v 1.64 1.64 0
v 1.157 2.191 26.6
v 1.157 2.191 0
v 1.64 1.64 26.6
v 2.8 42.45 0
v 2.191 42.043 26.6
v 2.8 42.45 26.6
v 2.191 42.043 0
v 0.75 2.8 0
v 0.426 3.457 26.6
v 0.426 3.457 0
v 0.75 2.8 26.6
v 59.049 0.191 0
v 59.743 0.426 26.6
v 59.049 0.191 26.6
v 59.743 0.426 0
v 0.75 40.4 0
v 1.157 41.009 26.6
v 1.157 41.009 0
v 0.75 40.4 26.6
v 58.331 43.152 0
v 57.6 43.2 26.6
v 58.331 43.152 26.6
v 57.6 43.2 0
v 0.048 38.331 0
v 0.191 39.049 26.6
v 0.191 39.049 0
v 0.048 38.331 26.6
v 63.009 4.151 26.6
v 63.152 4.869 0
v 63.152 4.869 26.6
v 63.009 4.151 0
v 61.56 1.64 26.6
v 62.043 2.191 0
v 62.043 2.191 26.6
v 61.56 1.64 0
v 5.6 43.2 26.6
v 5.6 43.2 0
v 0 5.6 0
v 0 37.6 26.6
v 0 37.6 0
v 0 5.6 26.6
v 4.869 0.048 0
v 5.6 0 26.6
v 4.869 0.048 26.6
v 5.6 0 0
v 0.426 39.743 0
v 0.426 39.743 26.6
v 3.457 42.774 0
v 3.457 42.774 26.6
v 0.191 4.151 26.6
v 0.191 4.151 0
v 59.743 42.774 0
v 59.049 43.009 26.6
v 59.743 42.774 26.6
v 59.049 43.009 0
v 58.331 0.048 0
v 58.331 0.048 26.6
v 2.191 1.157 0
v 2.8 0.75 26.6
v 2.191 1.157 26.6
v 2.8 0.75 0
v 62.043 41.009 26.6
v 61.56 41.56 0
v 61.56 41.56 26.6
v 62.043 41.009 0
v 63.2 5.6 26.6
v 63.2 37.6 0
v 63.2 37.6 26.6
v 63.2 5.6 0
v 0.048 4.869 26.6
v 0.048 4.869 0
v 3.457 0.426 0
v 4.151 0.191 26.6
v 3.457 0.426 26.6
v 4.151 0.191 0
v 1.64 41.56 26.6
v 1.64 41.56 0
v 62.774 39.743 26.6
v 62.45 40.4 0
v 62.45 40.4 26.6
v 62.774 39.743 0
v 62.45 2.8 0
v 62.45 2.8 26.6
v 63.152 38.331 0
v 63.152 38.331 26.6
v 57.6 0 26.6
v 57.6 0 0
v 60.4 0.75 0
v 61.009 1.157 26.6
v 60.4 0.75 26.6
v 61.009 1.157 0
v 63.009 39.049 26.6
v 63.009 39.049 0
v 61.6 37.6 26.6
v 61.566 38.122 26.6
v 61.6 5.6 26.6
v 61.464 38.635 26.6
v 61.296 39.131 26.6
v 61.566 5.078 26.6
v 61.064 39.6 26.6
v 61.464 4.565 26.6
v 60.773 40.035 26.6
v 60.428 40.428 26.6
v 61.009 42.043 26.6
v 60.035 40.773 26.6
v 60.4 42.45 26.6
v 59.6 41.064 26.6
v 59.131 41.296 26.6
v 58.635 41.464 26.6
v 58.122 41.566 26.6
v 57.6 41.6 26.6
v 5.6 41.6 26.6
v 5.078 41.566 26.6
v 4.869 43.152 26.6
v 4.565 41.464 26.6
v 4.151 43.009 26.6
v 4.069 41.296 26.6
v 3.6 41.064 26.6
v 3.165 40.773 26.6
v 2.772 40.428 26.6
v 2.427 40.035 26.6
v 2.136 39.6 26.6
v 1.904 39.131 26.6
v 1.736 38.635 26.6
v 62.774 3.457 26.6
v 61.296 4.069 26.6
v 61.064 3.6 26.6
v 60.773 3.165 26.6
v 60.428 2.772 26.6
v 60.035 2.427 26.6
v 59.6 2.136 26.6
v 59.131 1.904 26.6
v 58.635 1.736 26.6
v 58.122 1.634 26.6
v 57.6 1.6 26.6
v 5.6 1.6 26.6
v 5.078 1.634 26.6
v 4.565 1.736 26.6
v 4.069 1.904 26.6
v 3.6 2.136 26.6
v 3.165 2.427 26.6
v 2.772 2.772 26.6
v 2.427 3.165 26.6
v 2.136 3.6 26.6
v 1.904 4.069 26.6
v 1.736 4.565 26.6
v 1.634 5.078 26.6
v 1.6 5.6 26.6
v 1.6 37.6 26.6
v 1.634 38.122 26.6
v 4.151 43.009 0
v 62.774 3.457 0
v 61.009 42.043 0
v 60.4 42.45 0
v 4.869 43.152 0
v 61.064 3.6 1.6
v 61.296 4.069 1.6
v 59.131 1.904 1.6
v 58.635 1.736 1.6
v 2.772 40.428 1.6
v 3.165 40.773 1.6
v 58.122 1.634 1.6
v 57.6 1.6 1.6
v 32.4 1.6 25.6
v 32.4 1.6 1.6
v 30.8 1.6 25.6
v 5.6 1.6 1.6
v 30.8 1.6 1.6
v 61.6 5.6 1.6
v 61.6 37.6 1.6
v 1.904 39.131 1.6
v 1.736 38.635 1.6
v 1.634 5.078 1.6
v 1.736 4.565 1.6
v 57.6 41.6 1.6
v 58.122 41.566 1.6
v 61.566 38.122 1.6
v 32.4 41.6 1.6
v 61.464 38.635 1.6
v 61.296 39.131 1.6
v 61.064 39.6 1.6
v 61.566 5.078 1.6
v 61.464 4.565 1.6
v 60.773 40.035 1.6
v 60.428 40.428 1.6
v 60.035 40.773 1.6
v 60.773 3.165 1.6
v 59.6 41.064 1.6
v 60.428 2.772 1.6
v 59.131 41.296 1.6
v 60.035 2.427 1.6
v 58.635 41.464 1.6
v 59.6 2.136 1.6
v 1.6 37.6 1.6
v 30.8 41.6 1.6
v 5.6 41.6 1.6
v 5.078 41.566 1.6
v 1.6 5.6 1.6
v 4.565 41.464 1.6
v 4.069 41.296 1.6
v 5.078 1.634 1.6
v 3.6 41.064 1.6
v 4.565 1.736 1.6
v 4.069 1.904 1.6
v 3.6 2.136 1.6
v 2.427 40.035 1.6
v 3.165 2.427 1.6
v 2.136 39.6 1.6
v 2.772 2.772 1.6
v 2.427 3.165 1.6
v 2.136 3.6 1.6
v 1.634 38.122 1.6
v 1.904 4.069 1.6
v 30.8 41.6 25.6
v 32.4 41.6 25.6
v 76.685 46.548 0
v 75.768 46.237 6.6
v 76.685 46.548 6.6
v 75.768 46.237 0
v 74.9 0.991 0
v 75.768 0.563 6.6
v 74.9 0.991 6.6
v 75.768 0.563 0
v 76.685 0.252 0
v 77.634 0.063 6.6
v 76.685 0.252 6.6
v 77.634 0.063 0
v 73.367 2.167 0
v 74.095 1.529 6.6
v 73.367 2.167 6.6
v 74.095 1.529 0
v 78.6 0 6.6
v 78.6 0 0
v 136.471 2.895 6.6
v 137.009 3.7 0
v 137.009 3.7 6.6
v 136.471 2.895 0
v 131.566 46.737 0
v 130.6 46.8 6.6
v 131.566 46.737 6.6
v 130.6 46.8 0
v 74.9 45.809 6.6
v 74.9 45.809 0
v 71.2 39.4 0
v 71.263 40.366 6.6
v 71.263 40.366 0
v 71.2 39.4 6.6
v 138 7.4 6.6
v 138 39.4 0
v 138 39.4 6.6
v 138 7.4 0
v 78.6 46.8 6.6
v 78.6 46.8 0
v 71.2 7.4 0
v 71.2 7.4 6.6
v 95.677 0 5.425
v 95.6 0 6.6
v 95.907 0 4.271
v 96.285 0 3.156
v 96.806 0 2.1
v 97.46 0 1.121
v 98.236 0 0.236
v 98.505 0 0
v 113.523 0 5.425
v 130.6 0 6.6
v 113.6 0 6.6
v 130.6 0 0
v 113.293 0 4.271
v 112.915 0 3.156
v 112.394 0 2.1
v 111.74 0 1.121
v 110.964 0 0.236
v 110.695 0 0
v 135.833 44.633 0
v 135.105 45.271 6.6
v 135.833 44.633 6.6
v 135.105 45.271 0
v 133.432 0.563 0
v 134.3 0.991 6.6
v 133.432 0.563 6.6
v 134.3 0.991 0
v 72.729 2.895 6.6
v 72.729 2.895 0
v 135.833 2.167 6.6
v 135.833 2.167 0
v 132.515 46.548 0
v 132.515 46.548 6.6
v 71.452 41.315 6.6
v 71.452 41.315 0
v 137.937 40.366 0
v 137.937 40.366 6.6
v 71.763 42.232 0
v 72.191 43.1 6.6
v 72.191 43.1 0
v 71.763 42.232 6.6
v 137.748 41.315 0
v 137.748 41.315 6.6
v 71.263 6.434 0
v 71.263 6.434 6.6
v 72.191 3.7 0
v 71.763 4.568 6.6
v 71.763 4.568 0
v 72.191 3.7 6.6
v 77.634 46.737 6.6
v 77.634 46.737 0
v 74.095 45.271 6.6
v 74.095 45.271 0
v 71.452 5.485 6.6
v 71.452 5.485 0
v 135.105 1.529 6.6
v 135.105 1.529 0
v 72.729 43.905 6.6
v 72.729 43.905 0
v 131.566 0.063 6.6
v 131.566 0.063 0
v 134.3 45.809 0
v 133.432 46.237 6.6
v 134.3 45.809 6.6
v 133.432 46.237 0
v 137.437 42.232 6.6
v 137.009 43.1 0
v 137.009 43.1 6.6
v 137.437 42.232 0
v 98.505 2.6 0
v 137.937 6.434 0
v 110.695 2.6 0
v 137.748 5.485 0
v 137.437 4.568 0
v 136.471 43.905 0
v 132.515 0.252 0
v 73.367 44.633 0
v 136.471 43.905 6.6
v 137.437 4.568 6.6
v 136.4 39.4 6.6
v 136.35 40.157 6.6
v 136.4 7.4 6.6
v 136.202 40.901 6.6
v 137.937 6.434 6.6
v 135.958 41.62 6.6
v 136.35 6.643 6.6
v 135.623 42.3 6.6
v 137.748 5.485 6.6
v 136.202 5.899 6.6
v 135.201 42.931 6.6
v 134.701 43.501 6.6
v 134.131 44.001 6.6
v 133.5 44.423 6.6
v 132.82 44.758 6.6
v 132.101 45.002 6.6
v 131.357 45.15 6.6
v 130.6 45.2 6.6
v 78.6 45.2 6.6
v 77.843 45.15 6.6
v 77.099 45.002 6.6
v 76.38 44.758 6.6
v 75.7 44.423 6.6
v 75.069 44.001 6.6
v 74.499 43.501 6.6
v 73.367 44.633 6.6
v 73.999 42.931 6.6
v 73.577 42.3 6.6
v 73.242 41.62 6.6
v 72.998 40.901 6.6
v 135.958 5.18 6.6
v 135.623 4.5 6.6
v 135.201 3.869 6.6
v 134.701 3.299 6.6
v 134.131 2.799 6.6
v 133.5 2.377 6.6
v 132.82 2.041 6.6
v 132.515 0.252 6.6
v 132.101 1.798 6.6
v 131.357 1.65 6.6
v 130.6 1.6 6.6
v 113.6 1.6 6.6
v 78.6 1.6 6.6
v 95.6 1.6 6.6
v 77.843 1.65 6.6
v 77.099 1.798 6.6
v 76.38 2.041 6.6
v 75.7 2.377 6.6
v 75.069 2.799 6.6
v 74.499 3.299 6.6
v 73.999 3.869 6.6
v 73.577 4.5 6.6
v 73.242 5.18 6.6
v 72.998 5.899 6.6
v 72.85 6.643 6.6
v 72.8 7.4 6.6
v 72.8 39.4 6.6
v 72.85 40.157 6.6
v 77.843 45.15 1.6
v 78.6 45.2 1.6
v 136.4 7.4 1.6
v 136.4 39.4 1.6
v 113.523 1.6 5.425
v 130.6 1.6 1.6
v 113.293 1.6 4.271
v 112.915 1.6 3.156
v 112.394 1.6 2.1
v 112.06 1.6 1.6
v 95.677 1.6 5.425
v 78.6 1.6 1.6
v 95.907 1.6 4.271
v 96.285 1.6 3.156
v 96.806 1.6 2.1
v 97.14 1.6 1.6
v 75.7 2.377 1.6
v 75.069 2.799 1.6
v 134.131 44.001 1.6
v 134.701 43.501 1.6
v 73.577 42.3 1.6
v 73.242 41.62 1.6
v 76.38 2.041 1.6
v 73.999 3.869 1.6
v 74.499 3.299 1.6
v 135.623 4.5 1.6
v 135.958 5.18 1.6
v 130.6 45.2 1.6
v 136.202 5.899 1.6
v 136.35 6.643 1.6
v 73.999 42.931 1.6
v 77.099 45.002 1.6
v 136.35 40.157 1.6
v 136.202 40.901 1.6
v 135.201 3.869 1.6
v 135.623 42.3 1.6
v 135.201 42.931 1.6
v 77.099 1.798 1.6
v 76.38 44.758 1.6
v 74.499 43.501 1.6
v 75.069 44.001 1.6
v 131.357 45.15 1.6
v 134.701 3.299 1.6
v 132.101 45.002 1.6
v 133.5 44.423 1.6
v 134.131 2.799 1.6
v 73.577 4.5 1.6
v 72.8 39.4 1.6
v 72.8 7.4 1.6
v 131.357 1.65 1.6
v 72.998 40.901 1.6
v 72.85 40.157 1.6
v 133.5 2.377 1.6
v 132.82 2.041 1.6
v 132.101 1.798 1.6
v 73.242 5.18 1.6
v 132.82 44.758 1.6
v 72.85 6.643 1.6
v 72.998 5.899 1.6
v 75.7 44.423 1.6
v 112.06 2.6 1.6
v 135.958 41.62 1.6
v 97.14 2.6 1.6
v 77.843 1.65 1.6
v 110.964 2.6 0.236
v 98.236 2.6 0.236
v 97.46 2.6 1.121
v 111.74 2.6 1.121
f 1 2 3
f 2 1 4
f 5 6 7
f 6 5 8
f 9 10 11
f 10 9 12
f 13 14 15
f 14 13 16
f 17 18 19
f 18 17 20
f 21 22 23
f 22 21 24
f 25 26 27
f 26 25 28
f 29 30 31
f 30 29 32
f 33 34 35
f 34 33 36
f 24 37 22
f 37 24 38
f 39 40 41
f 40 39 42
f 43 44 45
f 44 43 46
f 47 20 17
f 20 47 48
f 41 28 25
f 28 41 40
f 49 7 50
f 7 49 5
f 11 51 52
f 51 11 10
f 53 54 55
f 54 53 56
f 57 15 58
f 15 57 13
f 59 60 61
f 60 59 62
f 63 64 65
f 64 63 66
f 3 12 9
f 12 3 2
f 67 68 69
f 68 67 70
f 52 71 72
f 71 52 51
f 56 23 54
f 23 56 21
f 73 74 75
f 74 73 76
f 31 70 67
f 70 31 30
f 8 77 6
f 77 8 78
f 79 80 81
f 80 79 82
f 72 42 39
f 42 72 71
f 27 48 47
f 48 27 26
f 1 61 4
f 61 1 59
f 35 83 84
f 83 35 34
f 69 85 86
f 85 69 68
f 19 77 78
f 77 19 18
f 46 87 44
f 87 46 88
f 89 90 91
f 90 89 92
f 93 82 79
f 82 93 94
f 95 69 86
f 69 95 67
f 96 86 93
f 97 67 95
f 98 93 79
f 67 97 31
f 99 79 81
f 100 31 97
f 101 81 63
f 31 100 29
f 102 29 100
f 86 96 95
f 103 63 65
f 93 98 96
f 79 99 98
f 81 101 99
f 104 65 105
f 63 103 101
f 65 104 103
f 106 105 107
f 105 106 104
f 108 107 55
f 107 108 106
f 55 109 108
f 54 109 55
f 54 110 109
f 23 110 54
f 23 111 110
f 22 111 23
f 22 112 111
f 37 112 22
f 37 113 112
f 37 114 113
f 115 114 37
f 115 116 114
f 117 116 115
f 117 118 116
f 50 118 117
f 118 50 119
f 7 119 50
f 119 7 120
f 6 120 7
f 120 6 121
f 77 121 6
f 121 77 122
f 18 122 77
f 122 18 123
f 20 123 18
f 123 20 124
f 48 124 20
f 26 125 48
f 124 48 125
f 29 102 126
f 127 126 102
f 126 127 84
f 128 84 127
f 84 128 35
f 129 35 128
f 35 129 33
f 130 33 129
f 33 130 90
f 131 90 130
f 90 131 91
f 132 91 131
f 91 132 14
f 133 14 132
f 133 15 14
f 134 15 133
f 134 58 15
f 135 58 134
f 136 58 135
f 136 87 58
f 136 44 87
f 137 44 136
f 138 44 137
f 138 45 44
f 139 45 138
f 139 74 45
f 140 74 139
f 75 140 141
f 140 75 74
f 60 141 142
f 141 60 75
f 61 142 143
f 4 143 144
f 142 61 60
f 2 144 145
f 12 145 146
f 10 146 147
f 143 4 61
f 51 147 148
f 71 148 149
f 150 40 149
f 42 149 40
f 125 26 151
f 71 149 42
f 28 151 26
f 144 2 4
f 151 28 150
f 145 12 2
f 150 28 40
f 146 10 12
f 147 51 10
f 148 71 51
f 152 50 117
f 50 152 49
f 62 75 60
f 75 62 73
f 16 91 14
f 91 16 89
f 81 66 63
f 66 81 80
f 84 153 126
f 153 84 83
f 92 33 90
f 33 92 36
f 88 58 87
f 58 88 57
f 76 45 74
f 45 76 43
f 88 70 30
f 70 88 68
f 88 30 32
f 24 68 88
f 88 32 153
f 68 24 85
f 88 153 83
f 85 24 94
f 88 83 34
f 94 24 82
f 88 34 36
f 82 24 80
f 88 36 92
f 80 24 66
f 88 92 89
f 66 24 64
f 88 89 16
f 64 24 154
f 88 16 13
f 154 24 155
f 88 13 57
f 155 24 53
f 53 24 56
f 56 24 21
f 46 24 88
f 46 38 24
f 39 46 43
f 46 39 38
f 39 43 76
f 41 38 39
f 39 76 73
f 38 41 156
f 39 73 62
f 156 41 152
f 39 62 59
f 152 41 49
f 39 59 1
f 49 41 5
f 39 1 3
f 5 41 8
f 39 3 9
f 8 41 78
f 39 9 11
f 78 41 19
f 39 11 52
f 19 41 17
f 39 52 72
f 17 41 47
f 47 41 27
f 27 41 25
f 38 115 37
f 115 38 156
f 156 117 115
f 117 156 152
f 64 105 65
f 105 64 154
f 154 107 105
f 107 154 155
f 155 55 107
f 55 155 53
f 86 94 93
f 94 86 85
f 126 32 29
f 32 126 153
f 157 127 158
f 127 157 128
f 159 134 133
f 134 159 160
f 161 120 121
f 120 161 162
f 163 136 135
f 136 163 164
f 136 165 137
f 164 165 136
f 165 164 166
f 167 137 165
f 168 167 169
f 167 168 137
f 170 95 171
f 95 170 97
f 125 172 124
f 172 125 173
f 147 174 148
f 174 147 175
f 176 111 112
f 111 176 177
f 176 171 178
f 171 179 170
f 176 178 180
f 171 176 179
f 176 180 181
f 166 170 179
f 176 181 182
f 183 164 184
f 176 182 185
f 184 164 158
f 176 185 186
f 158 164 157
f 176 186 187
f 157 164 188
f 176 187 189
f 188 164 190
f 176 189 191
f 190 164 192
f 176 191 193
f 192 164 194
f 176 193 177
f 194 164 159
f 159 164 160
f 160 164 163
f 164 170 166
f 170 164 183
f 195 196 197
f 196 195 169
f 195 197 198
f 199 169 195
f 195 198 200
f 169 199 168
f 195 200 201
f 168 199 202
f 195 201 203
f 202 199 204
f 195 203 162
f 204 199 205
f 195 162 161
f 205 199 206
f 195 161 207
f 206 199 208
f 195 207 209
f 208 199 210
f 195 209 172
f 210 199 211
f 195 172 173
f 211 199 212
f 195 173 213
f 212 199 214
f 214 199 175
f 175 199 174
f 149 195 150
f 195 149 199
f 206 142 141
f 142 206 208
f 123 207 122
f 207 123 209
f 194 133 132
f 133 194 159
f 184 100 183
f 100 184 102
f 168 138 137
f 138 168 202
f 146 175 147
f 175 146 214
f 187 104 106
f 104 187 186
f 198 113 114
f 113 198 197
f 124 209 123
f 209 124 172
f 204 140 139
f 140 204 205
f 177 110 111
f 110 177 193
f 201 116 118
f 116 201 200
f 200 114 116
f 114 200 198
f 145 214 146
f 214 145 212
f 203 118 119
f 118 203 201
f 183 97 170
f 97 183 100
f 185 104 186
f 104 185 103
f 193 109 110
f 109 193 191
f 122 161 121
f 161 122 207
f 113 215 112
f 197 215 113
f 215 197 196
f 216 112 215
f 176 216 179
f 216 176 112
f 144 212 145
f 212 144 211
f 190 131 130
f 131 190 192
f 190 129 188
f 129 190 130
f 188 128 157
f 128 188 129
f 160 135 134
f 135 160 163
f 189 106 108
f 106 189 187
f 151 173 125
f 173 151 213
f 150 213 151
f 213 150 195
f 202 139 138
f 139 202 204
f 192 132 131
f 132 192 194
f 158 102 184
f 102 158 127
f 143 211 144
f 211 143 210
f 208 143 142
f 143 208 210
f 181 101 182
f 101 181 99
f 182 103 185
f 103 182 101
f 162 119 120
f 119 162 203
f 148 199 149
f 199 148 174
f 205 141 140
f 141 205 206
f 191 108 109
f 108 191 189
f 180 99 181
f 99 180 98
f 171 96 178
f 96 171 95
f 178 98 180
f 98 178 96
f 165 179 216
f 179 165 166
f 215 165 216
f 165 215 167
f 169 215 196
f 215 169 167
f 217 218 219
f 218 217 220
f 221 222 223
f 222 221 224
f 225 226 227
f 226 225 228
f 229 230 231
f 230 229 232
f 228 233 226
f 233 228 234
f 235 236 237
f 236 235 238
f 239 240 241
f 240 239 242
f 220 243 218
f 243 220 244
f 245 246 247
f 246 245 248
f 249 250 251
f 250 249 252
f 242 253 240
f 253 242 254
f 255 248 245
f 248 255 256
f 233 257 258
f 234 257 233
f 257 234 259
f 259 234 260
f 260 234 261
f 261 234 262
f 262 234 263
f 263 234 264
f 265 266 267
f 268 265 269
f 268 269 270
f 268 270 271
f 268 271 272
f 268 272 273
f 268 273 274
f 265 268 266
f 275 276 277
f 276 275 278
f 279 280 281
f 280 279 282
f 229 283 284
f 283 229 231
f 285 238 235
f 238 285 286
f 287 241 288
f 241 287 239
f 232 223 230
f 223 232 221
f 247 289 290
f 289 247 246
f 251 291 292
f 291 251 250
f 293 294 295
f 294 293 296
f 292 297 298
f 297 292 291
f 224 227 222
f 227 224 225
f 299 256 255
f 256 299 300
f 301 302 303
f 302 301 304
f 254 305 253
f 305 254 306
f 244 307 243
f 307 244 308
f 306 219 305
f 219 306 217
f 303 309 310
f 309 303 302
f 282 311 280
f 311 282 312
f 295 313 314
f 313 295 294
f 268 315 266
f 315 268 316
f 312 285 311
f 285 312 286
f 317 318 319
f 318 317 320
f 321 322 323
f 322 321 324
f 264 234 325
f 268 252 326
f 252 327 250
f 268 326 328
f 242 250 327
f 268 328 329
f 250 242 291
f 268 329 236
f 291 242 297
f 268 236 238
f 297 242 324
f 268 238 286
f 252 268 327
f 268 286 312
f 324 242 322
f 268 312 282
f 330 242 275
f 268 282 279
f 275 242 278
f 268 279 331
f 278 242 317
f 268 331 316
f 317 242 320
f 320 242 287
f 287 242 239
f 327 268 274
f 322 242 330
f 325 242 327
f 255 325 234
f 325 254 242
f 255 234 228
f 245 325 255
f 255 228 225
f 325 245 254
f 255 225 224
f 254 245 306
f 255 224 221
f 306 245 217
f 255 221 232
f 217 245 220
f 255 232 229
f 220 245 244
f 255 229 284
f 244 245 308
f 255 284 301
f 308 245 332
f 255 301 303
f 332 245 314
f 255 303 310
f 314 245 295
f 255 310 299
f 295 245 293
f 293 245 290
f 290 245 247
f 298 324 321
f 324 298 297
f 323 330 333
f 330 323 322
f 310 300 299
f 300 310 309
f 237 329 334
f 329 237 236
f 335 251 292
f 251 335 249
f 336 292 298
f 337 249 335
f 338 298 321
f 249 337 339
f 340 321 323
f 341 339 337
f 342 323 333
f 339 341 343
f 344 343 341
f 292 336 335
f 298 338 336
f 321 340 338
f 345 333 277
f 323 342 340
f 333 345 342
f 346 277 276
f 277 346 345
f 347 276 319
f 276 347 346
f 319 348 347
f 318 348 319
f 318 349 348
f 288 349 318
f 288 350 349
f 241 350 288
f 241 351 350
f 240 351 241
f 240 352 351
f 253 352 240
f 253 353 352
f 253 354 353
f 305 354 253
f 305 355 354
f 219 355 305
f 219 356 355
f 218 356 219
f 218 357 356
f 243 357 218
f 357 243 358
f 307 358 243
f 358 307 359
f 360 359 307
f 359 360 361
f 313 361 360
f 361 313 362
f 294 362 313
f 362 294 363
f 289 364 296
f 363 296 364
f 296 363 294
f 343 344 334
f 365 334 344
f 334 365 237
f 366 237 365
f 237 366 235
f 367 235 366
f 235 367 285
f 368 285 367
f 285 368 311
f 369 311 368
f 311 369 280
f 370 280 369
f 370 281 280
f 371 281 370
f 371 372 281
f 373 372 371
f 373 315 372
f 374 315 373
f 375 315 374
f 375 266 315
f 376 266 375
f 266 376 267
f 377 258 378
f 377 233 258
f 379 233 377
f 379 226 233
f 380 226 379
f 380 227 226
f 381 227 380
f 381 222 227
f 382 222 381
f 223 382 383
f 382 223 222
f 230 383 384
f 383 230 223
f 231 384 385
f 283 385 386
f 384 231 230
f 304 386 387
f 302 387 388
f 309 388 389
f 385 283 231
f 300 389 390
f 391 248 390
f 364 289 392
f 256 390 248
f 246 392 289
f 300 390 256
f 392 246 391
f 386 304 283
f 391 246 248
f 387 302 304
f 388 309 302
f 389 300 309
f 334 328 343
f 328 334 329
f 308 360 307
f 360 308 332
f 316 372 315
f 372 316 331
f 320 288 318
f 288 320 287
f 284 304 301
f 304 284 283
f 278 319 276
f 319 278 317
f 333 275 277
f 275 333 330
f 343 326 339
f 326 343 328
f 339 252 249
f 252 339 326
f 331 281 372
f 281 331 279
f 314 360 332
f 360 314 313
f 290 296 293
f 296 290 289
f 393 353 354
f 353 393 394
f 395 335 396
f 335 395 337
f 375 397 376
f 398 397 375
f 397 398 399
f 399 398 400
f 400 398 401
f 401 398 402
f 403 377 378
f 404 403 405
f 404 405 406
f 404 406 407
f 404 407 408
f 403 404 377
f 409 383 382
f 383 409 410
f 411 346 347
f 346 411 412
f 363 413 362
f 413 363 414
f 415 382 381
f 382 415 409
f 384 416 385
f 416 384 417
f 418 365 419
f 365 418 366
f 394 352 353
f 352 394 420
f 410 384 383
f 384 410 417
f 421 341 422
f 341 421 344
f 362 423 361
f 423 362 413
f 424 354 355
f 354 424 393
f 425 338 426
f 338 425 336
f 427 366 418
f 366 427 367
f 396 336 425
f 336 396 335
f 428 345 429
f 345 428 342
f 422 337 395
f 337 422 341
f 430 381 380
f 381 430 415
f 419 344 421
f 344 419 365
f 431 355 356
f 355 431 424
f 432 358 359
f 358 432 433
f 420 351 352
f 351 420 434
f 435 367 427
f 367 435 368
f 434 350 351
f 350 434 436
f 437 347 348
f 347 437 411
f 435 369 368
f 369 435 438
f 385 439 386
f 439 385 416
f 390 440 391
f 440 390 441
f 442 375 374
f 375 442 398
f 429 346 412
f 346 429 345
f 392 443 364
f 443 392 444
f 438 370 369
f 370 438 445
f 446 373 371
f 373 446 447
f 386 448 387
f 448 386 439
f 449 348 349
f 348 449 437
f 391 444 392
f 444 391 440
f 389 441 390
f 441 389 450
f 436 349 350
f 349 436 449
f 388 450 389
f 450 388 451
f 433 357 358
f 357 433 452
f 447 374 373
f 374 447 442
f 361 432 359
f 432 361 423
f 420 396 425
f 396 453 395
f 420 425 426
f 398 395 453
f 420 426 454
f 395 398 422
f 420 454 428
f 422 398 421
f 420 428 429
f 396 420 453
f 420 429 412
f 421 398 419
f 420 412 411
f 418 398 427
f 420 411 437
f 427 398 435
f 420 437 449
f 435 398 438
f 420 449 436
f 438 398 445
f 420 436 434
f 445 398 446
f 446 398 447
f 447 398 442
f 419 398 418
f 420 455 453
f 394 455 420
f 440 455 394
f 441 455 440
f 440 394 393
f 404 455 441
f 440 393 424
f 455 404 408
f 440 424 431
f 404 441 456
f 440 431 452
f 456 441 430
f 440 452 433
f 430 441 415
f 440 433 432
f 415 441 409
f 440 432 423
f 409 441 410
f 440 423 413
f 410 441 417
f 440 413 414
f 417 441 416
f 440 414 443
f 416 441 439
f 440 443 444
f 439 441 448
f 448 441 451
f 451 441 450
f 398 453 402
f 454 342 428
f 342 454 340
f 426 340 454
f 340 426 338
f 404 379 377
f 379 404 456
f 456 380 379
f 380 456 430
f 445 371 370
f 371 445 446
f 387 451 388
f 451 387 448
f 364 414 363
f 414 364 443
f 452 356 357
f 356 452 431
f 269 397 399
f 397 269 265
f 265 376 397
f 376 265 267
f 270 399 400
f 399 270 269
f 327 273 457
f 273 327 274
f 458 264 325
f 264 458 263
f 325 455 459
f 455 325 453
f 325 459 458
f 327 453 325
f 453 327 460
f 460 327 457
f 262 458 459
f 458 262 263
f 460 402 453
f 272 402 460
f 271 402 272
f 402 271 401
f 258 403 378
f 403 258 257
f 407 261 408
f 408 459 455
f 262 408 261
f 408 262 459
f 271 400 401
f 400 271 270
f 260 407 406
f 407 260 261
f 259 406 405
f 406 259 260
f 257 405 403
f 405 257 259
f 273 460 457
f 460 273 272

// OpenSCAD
// Rounded storage box with an optional friction-fit lid.

/* [Box] */
// Inside width, depth and height, mm
inner_size = [60, 40, 25]; // [10:200]
// Wall and floor thickness, mm
wall = 1.6; // [0.8:0.4:4]
// Corner radius, mm
corner_radius = 4; // [0:0.5:15]
// Dividers along the width
compartments = 2; // [1, 2, 3, 4]

/* [Lid] */
// What to generate
part = "both"; // [both:Box and lid, box:Box only, lid:Lid only]
// Depth of the lid rim, mm
lid_rim = 5; // [2:0.5:12]
// Gap between lid rim and box, mm
lid_clearance = 0.2; // [0:0.05:0.6]
// Cut a finger notch in the lid rim
finger_notch = true;

/* [Quality] */
$fn = 48; // [16:8:128]

/* [Hidden] */
outer = [inner_size[0] + 2 * wall, inner_size[1] + 2 * wall, inner_size[2] + wall];
r_outer = min(corner_radius + wall, min(outer[0], outer[1]) / 2 - 0.01);

module rounded_block(size, r) {
  rr = max(r, 0.01);
  hull()
    for (x = [rr, size[0] - rr], y = [rr, size[1] - rr])
      translate([x, y, 0]) cylinder(r = rr, h = size[2]);
}

module box() {
  difference() {
    rounded_block(outer, r_outer);
    translate([wall, wall, wall]) rounded_block([inner_size[0], inner_size[1], inner_size[2] + 1], r_outer - wall);
  }
  if (compartments > 1)
    for (i = [1:compartments - 1])
      translate([wall + i * inner_size[0] / compartments - wall / 2, wall / 2, 0])
        cube([wall, outer[1] - wall, outer[2] - 1]);
}

module lid() {
  gap = wall + lid_clearance;
  size = [outer[0] + 2 * gap, outer[1] + 2 * gap, wall + lid_rim];
  difference() {
    rounded_block(size, r_outer + gap);
    translate([wall, wall, wall])
      rounded_block([outer[0] + 2 * lid_clearance, outer[1] + 2 * lid_clearance, lid_rim + 1], r_outer + lid_clearance);
    if (finger_notch)
      translate([size[0] / 2, -1, wall + lid_rim]) rotate([-90, 0, 0]) cylinder(d = min(18, size[0] / 2), h = wall + 2);
  }
}

if (part != "lid") box();
if (part != "box") translate([part == "both" ? outer[0] + 8 : 0, 0, 0]) lid();
